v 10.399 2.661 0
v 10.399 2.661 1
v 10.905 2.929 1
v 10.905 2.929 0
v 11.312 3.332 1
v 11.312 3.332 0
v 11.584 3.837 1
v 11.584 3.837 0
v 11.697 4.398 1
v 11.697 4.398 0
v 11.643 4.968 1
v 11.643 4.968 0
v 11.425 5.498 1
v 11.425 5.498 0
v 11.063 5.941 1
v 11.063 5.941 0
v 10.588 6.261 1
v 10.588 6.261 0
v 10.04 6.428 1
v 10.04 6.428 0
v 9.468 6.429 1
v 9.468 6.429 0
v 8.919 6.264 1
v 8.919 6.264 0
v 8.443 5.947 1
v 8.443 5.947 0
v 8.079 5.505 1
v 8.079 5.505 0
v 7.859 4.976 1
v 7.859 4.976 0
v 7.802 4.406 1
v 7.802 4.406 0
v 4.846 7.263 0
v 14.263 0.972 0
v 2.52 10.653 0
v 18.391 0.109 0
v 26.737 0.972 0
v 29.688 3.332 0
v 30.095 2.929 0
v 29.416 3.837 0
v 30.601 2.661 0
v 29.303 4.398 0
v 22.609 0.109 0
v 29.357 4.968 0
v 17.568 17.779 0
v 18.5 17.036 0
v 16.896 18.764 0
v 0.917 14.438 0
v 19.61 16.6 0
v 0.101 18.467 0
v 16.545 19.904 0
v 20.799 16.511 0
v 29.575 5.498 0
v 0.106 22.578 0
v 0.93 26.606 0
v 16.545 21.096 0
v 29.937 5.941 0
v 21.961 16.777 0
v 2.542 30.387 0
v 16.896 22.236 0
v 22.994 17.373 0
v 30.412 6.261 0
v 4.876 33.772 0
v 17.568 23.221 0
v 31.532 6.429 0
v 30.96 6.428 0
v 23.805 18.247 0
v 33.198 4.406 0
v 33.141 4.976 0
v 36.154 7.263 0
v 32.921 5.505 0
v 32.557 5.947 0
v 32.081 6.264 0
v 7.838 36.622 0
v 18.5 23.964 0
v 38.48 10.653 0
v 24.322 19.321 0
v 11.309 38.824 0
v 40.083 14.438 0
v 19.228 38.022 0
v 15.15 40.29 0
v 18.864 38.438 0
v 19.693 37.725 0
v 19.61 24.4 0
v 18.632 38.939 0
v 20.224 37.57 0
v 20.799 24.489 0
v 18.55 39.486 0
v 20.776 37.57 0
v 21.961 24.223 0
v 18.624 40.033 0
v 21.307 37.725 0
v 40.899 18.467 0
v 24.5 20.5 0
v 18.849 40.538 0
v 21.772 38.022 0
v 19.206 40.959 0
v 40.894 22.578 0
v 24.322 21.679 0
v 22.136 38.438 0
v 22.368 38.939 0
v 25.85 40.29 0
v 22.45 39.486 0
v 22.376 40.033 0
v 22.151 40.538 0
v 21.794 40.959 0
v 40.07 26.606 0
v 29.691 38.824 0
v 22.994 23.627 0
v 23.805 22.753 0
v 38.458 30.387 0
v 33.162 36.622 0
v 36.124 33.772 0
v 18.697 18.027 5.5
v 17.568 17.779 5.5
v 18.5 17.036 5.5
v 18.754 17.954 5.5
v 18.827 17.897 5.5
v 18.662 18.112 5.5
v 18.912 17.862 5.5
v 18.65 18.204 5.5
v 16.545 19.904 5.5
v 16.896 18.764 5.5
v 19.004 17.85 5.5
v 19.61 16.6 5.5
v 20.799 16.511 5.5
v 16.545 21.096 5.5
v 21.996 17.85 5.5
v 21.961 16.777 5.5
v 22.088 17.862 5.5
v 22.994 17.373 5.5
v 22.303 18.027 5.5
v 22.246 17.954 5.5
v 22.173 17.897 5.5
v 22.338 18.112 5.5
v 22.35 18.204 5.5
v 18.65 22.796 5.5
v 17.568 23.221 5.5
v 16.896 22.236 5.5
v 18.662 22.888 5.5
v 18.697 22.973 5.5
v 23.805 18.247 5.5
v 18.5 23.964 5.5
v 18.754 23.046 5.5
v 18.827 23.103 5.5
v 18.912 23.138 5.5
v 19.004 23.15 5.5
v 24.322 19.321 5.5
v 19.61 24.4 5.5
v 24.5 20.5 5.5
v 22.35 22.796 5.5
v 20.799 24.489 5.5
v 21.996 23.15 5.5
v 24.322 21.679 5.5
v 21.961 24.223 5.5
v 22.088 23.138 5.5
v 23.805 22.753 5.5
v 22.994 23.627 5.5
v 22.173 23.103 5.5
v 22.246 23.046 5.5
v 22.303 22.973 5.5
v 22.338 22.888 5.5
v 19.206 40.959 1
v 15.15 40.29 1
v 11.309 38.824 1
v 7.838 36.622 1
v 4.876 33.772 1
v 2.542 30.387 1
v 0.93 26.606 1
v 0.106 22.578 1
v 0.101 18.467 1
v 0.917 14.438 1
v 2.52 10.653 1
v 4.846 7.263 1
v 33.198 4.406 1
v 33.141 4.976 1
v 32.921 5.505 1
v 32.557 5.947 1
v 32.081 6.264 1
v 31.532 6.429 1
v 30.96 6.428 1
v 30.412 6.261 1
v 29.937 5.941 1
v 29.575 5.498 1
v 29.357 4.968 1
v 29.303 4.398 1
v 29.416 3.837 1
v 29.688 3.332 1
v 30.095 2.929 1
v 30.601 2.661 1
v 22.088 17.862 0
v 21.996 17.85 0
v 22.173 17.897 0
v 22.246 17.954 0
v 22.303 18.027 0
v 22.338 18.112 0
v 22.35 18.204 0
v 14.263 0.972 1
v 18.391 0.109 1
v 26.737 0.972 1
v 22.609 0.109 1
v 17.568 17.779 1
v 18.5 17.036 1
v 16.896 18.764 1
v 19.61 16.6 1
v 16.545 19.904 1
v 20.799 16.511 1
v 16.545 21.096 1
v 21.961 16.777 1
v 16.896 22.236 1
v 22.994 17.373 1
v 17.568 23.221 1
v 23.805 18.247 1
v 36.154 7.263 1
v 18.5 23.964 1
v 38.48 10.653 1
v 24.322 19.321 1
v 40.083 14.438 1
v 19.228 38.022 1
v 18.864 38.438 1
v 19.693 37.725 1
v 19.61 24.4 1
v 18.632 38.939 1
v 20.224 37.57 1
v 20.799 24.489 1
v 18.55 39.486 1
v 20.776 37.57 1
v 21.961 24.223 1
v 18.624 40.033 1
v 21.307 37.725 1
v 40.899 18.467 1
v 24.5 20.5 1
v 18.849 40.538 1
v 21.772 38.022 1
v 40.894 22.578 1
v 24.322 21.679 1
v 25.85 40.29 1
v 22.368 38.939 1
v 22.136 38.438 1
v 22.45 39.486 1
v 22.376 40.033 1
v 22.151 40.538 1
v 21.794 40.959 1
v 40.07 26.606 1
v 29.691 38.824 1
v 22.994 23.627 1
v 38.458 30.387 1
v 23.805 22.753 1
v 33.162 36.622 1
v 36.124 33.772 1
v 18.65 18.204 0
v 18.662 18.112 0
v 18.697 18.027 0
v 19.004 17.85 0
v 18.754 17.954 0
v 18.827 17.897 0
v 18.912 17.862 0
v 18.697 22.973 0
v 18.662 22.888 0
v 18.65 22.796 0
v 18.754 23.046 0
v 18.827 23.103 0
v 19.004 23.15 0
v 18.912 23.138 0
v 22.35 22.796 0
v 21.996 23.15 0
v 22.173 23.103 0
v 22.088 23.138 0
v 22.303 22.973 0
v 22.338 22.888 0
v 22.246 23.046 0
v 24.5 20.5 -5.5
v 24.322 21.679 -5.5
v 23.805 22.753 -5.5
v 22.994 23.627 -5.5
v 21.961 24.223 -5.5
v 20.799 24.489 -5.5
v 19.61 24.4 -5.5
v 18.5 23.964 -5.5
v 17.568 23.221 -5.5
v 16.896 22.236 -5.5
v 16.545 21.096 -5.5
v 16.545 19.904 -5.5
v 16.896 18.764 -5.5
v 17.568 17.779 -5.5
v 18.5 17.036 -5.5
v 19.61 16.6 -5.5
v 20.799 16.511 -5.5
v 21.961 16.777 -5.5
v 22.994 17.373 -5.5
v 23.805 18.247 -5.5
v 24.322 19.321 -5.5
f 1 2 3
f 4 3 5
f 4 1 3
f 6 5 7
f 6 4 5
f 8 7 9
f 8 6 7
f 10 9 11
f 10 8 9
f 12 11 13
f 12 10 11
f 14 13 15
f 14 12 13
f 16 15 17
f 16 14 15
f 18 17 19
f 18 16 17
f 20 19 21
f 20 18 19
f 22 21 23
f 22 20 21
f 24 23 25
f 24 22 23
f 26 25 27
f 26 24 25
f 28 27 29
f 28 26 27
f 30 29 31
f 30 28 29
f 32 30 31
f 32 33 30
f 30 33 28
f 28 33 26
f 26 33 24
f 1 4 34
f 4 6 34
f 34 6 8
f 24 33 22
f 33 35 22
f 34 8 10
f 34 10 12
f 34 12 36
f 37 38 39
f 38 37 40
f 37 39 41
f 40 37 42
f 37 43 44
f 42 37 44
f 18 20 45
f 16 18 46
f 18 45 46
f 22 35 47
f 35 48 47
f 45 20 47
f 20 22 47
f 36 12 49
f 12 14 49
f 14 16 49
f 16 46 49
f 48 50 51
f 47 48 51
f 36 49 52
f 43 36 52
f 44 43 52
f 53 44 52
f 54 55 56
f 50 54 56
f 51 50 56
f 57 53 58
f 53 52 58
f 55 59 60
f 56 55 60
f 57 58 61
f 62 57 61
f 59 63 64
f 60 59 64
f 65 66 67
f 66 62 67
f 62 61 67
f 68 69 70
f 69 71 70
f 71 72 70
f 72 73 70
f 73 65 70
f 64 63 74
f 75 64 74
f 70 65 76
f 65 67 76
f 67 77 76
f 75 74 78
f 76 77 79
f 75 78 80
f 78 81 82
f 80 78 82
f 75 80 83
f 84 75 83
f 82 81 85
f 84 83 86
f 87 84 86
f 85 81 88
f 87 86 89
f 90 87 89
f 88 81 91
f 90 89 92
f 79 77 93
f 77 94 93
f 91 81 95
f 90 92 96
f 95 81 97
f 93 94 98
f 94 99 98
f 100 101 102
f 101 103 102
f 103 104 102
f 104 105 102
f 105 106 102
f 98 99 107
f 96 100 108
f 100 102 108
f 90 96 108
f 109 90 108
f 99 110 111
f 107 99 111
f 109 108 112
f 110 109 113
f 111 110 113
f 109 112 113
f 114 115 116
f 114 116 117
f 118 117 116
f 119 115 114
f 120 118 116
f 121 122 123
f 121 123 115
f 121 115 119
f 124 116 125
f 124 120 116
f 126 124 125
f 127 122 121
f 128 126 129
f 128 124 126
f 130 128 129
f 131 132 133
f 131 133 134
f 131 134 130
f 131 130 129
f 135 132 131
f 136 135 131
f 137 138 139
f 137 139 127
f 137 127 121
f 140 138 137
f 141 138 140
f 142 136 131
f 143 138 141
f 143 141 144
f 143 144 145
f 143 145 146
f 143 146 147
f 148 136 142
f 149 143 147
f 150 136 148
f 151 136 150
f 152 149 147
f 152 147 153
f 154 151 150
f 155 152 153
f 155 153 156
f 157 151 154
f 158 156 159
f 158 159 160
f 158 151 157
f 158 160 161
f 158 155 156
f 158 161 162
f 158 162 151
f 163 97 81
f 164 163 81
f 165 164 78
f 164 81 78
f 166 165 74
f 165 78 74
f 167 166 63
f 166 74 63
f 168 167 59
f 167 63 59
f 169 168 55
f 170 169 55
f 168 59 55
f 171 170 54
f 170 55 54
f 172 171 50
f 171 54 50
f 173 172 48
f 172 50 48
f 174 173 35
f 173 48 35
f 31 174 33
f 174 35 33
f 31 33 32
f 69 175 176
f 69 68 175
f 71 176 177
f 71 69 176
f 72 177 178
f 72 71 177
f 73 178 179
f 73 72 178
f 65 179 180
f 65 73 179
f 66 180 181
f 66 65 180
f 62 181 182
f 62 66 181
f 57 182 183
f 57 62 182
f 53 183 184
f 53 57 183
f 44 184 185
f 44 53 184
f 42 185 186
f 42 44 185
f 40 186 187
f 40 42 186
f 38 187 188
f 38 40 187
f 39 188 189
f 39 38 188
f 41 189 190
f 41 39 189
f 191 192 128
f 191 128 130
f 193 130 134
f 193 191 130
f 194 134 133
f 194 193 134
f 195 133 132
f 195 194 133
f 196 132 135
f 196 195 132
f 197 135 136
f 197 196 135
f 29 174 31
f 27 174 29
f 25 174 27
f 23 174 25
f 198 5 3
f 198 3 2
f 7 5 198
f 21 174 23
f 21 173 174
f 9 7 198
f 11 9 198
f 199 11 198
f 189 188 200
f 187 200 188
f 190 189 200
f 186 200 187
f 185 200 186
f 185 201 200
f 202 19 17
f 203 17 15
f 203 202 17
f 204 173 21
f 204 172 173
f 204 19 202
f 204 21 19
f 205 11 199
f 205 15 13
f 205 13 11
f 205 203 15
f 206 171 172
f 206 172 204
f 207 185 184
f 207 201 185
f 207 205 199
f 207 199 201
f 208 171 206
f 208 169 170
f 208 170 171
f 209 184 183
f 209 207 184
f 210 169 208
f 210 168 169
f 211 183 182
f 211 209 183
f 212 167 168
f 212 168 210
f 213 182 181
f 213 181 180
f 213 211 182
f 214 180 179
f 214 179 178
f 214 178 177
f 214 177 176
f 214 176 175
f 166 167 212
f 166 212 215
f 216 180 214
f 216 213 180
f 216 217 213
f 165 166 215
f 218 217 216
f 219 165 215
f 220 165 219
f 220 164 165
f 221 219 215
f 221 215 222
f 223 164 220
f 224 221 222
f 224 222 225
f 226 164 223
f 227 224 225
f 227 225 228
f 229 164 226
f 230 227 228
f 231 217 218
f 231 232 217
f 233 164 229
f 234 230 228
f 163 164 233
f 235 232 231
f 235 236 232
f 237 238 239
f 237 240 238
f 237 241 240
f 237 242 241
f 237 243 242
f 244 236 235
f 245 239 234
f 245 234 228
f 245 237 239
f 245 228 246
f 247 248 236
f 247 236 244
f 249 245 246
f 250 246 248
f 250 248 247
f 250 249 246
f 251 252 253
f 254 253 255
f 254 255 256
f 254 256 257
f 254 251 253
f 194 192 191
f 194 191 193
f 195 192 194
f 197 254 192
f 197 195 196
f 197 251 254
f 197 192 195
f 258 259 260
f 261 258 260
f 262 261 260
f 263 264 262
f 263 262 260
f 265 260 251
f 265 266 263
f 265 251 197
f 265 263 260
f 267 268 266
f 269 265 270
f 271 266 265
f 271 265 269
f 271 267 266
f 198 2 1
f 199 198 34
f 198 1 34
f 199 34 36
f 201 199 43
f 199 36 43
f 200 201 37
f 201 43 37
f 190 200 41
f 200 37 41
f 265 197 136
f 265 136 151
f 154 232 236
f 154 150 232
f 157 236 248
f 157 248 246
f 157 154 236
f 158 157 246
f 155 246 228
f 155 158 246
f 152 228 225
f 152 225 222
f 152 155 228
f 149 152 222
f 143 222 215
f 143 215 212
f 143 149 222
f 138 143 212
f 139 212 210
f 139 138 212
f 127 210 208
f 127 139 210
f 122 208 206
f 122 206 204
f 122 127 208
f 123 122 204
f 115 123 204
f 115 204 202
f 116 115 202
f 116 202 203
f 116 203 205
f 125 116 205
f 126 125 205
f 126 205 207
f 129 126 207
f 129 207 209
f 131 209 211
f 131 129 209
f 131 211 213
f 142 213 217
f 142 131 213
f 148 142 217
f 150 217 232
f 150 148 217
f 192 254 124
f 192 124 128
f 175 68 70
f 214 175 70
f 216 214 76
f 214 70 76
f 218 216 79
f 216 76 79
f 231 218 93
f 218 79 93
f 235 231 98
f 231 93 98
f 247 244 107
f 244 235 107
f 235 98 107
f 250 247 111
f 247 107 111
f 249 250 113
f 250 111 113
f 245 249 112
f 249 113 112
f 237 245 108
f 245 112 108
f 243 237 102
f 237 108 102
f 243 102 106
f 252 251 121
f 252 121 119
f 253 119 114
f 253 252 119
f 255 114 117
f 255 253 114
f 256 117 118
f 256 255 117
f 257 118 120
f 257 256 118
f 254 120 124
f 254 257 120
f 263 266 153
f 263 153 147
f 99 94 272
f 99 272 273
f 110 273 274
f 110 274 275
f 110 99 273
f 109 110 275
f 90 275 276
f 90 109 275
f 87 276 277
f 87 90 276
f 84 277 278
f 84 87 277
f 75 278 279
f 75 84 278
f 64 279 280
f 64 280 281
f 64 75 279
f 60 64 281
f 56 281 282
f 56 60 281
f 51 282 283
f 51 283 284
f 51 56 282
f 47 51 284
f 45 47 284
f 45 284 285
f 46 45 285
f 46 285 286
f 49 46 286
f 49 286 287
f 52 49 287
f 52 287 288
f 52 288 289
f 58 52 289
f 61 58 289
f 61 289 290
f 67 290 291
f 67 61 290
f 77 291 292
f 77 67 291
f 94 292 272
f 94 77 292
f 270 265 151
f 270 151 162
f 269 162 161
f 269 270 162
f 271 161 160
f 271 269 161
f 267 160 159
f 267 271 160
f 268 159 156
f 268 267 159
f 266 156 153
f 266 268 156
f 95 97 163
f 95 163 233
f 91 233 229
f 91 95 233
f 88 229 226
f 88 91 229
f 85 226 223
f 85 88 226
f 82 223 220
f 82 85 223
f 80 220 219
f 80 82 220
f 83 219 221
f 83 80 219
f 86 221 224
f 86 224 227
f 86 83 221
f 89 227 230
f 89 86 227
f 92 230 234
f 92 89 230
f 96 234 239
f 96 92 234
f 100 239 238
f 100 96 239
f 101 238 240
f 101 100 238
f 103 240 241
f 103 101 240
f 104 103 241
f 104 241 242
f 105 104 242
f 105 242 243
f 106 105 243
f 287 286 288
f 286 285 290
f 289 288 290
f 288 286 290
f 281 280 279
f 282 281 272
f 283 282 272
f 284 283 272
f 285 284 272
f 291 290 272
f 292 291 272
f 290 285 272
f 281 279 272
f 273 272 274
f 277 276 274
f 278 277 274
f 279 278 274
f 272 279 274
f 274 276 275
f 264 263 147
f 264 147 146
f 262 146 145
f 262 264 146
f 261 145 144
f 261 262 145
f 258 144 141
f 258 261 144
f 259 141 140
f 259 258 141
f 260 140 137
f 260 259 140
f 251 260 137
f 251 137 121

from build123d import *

# Parameters (mm, degrees)
SKETCH_R     = 20.5
PAD_DEPTH    = 1
SKETCH002_R  = 1.95
HOLE_DEPTH   = 1.001
SKETCH003_R  = 4
PAD001_DEPTH = 5.5
POCKET_DEPTH = 5.501


with BuildPart() as part:
    # Sketch → Pad (new body)
    with BuildSketch(Plane.XY):
        with Locations((20.5, 20.5)):
            Circle(SKETCH_R)
    extrude(amount=PAD_DEPTH)

    # Sketch002 → Hole (cut, through all)
    with BuildSketch(Plane.XY):
        with Locations((9.75, 4.5)):
            Circle(SKETCH002_R)
        with Locations((31.25, 4.5)):
            Circle(SKETCH002_R)
        with Locations((20.5, 39.5)):
            Circle(SKETCH002_R)
    extrude(amount=HOLE_DEPTH, mode=Mode.SUBTRACT)

    # Sketch003 → Pad001 (join, symmetric)
    with BuildSketch(Plane.XY):
        with Locations((20.5, 20.5)):
            Circle(SKETCH003_R)
    extrude(amount=PAD001_DEPTH, both=True)

    # Sketch004 → Pocket (cut, through all)
    with BuildSketch(Plane.XY):
        with BuildLine():
            Line((18.65, 22.796447), (18.65, 18.203553))
            ThreePointArc((18.65, 18.203553), (18.753553, 17.953553), (19.003553, 17.85))
            Line((19.003553, 17.85), (21.996447, 17.85))
            ThreePointArc((21.996447, 17.85), (22.246447, 17.953553), (22.35, 18.203553))
            Line((22.35, 18.203553), (22.35, 22.796447))
            ThreePointArc((22.35, 22.796447), (22.246447, 23.046447), (21.996447, 23.15))
            Line((21.996447, 23.15), (19.003553, 23.15))
            ThreePointArc((19.003553, 23.15), (18.753553, 23.046447), (18.65, 22.796447))
        make_face()
    extrude(amount=POCKET_DEPTH, mode=Mode.SUBTRACT)


solid = part.part
